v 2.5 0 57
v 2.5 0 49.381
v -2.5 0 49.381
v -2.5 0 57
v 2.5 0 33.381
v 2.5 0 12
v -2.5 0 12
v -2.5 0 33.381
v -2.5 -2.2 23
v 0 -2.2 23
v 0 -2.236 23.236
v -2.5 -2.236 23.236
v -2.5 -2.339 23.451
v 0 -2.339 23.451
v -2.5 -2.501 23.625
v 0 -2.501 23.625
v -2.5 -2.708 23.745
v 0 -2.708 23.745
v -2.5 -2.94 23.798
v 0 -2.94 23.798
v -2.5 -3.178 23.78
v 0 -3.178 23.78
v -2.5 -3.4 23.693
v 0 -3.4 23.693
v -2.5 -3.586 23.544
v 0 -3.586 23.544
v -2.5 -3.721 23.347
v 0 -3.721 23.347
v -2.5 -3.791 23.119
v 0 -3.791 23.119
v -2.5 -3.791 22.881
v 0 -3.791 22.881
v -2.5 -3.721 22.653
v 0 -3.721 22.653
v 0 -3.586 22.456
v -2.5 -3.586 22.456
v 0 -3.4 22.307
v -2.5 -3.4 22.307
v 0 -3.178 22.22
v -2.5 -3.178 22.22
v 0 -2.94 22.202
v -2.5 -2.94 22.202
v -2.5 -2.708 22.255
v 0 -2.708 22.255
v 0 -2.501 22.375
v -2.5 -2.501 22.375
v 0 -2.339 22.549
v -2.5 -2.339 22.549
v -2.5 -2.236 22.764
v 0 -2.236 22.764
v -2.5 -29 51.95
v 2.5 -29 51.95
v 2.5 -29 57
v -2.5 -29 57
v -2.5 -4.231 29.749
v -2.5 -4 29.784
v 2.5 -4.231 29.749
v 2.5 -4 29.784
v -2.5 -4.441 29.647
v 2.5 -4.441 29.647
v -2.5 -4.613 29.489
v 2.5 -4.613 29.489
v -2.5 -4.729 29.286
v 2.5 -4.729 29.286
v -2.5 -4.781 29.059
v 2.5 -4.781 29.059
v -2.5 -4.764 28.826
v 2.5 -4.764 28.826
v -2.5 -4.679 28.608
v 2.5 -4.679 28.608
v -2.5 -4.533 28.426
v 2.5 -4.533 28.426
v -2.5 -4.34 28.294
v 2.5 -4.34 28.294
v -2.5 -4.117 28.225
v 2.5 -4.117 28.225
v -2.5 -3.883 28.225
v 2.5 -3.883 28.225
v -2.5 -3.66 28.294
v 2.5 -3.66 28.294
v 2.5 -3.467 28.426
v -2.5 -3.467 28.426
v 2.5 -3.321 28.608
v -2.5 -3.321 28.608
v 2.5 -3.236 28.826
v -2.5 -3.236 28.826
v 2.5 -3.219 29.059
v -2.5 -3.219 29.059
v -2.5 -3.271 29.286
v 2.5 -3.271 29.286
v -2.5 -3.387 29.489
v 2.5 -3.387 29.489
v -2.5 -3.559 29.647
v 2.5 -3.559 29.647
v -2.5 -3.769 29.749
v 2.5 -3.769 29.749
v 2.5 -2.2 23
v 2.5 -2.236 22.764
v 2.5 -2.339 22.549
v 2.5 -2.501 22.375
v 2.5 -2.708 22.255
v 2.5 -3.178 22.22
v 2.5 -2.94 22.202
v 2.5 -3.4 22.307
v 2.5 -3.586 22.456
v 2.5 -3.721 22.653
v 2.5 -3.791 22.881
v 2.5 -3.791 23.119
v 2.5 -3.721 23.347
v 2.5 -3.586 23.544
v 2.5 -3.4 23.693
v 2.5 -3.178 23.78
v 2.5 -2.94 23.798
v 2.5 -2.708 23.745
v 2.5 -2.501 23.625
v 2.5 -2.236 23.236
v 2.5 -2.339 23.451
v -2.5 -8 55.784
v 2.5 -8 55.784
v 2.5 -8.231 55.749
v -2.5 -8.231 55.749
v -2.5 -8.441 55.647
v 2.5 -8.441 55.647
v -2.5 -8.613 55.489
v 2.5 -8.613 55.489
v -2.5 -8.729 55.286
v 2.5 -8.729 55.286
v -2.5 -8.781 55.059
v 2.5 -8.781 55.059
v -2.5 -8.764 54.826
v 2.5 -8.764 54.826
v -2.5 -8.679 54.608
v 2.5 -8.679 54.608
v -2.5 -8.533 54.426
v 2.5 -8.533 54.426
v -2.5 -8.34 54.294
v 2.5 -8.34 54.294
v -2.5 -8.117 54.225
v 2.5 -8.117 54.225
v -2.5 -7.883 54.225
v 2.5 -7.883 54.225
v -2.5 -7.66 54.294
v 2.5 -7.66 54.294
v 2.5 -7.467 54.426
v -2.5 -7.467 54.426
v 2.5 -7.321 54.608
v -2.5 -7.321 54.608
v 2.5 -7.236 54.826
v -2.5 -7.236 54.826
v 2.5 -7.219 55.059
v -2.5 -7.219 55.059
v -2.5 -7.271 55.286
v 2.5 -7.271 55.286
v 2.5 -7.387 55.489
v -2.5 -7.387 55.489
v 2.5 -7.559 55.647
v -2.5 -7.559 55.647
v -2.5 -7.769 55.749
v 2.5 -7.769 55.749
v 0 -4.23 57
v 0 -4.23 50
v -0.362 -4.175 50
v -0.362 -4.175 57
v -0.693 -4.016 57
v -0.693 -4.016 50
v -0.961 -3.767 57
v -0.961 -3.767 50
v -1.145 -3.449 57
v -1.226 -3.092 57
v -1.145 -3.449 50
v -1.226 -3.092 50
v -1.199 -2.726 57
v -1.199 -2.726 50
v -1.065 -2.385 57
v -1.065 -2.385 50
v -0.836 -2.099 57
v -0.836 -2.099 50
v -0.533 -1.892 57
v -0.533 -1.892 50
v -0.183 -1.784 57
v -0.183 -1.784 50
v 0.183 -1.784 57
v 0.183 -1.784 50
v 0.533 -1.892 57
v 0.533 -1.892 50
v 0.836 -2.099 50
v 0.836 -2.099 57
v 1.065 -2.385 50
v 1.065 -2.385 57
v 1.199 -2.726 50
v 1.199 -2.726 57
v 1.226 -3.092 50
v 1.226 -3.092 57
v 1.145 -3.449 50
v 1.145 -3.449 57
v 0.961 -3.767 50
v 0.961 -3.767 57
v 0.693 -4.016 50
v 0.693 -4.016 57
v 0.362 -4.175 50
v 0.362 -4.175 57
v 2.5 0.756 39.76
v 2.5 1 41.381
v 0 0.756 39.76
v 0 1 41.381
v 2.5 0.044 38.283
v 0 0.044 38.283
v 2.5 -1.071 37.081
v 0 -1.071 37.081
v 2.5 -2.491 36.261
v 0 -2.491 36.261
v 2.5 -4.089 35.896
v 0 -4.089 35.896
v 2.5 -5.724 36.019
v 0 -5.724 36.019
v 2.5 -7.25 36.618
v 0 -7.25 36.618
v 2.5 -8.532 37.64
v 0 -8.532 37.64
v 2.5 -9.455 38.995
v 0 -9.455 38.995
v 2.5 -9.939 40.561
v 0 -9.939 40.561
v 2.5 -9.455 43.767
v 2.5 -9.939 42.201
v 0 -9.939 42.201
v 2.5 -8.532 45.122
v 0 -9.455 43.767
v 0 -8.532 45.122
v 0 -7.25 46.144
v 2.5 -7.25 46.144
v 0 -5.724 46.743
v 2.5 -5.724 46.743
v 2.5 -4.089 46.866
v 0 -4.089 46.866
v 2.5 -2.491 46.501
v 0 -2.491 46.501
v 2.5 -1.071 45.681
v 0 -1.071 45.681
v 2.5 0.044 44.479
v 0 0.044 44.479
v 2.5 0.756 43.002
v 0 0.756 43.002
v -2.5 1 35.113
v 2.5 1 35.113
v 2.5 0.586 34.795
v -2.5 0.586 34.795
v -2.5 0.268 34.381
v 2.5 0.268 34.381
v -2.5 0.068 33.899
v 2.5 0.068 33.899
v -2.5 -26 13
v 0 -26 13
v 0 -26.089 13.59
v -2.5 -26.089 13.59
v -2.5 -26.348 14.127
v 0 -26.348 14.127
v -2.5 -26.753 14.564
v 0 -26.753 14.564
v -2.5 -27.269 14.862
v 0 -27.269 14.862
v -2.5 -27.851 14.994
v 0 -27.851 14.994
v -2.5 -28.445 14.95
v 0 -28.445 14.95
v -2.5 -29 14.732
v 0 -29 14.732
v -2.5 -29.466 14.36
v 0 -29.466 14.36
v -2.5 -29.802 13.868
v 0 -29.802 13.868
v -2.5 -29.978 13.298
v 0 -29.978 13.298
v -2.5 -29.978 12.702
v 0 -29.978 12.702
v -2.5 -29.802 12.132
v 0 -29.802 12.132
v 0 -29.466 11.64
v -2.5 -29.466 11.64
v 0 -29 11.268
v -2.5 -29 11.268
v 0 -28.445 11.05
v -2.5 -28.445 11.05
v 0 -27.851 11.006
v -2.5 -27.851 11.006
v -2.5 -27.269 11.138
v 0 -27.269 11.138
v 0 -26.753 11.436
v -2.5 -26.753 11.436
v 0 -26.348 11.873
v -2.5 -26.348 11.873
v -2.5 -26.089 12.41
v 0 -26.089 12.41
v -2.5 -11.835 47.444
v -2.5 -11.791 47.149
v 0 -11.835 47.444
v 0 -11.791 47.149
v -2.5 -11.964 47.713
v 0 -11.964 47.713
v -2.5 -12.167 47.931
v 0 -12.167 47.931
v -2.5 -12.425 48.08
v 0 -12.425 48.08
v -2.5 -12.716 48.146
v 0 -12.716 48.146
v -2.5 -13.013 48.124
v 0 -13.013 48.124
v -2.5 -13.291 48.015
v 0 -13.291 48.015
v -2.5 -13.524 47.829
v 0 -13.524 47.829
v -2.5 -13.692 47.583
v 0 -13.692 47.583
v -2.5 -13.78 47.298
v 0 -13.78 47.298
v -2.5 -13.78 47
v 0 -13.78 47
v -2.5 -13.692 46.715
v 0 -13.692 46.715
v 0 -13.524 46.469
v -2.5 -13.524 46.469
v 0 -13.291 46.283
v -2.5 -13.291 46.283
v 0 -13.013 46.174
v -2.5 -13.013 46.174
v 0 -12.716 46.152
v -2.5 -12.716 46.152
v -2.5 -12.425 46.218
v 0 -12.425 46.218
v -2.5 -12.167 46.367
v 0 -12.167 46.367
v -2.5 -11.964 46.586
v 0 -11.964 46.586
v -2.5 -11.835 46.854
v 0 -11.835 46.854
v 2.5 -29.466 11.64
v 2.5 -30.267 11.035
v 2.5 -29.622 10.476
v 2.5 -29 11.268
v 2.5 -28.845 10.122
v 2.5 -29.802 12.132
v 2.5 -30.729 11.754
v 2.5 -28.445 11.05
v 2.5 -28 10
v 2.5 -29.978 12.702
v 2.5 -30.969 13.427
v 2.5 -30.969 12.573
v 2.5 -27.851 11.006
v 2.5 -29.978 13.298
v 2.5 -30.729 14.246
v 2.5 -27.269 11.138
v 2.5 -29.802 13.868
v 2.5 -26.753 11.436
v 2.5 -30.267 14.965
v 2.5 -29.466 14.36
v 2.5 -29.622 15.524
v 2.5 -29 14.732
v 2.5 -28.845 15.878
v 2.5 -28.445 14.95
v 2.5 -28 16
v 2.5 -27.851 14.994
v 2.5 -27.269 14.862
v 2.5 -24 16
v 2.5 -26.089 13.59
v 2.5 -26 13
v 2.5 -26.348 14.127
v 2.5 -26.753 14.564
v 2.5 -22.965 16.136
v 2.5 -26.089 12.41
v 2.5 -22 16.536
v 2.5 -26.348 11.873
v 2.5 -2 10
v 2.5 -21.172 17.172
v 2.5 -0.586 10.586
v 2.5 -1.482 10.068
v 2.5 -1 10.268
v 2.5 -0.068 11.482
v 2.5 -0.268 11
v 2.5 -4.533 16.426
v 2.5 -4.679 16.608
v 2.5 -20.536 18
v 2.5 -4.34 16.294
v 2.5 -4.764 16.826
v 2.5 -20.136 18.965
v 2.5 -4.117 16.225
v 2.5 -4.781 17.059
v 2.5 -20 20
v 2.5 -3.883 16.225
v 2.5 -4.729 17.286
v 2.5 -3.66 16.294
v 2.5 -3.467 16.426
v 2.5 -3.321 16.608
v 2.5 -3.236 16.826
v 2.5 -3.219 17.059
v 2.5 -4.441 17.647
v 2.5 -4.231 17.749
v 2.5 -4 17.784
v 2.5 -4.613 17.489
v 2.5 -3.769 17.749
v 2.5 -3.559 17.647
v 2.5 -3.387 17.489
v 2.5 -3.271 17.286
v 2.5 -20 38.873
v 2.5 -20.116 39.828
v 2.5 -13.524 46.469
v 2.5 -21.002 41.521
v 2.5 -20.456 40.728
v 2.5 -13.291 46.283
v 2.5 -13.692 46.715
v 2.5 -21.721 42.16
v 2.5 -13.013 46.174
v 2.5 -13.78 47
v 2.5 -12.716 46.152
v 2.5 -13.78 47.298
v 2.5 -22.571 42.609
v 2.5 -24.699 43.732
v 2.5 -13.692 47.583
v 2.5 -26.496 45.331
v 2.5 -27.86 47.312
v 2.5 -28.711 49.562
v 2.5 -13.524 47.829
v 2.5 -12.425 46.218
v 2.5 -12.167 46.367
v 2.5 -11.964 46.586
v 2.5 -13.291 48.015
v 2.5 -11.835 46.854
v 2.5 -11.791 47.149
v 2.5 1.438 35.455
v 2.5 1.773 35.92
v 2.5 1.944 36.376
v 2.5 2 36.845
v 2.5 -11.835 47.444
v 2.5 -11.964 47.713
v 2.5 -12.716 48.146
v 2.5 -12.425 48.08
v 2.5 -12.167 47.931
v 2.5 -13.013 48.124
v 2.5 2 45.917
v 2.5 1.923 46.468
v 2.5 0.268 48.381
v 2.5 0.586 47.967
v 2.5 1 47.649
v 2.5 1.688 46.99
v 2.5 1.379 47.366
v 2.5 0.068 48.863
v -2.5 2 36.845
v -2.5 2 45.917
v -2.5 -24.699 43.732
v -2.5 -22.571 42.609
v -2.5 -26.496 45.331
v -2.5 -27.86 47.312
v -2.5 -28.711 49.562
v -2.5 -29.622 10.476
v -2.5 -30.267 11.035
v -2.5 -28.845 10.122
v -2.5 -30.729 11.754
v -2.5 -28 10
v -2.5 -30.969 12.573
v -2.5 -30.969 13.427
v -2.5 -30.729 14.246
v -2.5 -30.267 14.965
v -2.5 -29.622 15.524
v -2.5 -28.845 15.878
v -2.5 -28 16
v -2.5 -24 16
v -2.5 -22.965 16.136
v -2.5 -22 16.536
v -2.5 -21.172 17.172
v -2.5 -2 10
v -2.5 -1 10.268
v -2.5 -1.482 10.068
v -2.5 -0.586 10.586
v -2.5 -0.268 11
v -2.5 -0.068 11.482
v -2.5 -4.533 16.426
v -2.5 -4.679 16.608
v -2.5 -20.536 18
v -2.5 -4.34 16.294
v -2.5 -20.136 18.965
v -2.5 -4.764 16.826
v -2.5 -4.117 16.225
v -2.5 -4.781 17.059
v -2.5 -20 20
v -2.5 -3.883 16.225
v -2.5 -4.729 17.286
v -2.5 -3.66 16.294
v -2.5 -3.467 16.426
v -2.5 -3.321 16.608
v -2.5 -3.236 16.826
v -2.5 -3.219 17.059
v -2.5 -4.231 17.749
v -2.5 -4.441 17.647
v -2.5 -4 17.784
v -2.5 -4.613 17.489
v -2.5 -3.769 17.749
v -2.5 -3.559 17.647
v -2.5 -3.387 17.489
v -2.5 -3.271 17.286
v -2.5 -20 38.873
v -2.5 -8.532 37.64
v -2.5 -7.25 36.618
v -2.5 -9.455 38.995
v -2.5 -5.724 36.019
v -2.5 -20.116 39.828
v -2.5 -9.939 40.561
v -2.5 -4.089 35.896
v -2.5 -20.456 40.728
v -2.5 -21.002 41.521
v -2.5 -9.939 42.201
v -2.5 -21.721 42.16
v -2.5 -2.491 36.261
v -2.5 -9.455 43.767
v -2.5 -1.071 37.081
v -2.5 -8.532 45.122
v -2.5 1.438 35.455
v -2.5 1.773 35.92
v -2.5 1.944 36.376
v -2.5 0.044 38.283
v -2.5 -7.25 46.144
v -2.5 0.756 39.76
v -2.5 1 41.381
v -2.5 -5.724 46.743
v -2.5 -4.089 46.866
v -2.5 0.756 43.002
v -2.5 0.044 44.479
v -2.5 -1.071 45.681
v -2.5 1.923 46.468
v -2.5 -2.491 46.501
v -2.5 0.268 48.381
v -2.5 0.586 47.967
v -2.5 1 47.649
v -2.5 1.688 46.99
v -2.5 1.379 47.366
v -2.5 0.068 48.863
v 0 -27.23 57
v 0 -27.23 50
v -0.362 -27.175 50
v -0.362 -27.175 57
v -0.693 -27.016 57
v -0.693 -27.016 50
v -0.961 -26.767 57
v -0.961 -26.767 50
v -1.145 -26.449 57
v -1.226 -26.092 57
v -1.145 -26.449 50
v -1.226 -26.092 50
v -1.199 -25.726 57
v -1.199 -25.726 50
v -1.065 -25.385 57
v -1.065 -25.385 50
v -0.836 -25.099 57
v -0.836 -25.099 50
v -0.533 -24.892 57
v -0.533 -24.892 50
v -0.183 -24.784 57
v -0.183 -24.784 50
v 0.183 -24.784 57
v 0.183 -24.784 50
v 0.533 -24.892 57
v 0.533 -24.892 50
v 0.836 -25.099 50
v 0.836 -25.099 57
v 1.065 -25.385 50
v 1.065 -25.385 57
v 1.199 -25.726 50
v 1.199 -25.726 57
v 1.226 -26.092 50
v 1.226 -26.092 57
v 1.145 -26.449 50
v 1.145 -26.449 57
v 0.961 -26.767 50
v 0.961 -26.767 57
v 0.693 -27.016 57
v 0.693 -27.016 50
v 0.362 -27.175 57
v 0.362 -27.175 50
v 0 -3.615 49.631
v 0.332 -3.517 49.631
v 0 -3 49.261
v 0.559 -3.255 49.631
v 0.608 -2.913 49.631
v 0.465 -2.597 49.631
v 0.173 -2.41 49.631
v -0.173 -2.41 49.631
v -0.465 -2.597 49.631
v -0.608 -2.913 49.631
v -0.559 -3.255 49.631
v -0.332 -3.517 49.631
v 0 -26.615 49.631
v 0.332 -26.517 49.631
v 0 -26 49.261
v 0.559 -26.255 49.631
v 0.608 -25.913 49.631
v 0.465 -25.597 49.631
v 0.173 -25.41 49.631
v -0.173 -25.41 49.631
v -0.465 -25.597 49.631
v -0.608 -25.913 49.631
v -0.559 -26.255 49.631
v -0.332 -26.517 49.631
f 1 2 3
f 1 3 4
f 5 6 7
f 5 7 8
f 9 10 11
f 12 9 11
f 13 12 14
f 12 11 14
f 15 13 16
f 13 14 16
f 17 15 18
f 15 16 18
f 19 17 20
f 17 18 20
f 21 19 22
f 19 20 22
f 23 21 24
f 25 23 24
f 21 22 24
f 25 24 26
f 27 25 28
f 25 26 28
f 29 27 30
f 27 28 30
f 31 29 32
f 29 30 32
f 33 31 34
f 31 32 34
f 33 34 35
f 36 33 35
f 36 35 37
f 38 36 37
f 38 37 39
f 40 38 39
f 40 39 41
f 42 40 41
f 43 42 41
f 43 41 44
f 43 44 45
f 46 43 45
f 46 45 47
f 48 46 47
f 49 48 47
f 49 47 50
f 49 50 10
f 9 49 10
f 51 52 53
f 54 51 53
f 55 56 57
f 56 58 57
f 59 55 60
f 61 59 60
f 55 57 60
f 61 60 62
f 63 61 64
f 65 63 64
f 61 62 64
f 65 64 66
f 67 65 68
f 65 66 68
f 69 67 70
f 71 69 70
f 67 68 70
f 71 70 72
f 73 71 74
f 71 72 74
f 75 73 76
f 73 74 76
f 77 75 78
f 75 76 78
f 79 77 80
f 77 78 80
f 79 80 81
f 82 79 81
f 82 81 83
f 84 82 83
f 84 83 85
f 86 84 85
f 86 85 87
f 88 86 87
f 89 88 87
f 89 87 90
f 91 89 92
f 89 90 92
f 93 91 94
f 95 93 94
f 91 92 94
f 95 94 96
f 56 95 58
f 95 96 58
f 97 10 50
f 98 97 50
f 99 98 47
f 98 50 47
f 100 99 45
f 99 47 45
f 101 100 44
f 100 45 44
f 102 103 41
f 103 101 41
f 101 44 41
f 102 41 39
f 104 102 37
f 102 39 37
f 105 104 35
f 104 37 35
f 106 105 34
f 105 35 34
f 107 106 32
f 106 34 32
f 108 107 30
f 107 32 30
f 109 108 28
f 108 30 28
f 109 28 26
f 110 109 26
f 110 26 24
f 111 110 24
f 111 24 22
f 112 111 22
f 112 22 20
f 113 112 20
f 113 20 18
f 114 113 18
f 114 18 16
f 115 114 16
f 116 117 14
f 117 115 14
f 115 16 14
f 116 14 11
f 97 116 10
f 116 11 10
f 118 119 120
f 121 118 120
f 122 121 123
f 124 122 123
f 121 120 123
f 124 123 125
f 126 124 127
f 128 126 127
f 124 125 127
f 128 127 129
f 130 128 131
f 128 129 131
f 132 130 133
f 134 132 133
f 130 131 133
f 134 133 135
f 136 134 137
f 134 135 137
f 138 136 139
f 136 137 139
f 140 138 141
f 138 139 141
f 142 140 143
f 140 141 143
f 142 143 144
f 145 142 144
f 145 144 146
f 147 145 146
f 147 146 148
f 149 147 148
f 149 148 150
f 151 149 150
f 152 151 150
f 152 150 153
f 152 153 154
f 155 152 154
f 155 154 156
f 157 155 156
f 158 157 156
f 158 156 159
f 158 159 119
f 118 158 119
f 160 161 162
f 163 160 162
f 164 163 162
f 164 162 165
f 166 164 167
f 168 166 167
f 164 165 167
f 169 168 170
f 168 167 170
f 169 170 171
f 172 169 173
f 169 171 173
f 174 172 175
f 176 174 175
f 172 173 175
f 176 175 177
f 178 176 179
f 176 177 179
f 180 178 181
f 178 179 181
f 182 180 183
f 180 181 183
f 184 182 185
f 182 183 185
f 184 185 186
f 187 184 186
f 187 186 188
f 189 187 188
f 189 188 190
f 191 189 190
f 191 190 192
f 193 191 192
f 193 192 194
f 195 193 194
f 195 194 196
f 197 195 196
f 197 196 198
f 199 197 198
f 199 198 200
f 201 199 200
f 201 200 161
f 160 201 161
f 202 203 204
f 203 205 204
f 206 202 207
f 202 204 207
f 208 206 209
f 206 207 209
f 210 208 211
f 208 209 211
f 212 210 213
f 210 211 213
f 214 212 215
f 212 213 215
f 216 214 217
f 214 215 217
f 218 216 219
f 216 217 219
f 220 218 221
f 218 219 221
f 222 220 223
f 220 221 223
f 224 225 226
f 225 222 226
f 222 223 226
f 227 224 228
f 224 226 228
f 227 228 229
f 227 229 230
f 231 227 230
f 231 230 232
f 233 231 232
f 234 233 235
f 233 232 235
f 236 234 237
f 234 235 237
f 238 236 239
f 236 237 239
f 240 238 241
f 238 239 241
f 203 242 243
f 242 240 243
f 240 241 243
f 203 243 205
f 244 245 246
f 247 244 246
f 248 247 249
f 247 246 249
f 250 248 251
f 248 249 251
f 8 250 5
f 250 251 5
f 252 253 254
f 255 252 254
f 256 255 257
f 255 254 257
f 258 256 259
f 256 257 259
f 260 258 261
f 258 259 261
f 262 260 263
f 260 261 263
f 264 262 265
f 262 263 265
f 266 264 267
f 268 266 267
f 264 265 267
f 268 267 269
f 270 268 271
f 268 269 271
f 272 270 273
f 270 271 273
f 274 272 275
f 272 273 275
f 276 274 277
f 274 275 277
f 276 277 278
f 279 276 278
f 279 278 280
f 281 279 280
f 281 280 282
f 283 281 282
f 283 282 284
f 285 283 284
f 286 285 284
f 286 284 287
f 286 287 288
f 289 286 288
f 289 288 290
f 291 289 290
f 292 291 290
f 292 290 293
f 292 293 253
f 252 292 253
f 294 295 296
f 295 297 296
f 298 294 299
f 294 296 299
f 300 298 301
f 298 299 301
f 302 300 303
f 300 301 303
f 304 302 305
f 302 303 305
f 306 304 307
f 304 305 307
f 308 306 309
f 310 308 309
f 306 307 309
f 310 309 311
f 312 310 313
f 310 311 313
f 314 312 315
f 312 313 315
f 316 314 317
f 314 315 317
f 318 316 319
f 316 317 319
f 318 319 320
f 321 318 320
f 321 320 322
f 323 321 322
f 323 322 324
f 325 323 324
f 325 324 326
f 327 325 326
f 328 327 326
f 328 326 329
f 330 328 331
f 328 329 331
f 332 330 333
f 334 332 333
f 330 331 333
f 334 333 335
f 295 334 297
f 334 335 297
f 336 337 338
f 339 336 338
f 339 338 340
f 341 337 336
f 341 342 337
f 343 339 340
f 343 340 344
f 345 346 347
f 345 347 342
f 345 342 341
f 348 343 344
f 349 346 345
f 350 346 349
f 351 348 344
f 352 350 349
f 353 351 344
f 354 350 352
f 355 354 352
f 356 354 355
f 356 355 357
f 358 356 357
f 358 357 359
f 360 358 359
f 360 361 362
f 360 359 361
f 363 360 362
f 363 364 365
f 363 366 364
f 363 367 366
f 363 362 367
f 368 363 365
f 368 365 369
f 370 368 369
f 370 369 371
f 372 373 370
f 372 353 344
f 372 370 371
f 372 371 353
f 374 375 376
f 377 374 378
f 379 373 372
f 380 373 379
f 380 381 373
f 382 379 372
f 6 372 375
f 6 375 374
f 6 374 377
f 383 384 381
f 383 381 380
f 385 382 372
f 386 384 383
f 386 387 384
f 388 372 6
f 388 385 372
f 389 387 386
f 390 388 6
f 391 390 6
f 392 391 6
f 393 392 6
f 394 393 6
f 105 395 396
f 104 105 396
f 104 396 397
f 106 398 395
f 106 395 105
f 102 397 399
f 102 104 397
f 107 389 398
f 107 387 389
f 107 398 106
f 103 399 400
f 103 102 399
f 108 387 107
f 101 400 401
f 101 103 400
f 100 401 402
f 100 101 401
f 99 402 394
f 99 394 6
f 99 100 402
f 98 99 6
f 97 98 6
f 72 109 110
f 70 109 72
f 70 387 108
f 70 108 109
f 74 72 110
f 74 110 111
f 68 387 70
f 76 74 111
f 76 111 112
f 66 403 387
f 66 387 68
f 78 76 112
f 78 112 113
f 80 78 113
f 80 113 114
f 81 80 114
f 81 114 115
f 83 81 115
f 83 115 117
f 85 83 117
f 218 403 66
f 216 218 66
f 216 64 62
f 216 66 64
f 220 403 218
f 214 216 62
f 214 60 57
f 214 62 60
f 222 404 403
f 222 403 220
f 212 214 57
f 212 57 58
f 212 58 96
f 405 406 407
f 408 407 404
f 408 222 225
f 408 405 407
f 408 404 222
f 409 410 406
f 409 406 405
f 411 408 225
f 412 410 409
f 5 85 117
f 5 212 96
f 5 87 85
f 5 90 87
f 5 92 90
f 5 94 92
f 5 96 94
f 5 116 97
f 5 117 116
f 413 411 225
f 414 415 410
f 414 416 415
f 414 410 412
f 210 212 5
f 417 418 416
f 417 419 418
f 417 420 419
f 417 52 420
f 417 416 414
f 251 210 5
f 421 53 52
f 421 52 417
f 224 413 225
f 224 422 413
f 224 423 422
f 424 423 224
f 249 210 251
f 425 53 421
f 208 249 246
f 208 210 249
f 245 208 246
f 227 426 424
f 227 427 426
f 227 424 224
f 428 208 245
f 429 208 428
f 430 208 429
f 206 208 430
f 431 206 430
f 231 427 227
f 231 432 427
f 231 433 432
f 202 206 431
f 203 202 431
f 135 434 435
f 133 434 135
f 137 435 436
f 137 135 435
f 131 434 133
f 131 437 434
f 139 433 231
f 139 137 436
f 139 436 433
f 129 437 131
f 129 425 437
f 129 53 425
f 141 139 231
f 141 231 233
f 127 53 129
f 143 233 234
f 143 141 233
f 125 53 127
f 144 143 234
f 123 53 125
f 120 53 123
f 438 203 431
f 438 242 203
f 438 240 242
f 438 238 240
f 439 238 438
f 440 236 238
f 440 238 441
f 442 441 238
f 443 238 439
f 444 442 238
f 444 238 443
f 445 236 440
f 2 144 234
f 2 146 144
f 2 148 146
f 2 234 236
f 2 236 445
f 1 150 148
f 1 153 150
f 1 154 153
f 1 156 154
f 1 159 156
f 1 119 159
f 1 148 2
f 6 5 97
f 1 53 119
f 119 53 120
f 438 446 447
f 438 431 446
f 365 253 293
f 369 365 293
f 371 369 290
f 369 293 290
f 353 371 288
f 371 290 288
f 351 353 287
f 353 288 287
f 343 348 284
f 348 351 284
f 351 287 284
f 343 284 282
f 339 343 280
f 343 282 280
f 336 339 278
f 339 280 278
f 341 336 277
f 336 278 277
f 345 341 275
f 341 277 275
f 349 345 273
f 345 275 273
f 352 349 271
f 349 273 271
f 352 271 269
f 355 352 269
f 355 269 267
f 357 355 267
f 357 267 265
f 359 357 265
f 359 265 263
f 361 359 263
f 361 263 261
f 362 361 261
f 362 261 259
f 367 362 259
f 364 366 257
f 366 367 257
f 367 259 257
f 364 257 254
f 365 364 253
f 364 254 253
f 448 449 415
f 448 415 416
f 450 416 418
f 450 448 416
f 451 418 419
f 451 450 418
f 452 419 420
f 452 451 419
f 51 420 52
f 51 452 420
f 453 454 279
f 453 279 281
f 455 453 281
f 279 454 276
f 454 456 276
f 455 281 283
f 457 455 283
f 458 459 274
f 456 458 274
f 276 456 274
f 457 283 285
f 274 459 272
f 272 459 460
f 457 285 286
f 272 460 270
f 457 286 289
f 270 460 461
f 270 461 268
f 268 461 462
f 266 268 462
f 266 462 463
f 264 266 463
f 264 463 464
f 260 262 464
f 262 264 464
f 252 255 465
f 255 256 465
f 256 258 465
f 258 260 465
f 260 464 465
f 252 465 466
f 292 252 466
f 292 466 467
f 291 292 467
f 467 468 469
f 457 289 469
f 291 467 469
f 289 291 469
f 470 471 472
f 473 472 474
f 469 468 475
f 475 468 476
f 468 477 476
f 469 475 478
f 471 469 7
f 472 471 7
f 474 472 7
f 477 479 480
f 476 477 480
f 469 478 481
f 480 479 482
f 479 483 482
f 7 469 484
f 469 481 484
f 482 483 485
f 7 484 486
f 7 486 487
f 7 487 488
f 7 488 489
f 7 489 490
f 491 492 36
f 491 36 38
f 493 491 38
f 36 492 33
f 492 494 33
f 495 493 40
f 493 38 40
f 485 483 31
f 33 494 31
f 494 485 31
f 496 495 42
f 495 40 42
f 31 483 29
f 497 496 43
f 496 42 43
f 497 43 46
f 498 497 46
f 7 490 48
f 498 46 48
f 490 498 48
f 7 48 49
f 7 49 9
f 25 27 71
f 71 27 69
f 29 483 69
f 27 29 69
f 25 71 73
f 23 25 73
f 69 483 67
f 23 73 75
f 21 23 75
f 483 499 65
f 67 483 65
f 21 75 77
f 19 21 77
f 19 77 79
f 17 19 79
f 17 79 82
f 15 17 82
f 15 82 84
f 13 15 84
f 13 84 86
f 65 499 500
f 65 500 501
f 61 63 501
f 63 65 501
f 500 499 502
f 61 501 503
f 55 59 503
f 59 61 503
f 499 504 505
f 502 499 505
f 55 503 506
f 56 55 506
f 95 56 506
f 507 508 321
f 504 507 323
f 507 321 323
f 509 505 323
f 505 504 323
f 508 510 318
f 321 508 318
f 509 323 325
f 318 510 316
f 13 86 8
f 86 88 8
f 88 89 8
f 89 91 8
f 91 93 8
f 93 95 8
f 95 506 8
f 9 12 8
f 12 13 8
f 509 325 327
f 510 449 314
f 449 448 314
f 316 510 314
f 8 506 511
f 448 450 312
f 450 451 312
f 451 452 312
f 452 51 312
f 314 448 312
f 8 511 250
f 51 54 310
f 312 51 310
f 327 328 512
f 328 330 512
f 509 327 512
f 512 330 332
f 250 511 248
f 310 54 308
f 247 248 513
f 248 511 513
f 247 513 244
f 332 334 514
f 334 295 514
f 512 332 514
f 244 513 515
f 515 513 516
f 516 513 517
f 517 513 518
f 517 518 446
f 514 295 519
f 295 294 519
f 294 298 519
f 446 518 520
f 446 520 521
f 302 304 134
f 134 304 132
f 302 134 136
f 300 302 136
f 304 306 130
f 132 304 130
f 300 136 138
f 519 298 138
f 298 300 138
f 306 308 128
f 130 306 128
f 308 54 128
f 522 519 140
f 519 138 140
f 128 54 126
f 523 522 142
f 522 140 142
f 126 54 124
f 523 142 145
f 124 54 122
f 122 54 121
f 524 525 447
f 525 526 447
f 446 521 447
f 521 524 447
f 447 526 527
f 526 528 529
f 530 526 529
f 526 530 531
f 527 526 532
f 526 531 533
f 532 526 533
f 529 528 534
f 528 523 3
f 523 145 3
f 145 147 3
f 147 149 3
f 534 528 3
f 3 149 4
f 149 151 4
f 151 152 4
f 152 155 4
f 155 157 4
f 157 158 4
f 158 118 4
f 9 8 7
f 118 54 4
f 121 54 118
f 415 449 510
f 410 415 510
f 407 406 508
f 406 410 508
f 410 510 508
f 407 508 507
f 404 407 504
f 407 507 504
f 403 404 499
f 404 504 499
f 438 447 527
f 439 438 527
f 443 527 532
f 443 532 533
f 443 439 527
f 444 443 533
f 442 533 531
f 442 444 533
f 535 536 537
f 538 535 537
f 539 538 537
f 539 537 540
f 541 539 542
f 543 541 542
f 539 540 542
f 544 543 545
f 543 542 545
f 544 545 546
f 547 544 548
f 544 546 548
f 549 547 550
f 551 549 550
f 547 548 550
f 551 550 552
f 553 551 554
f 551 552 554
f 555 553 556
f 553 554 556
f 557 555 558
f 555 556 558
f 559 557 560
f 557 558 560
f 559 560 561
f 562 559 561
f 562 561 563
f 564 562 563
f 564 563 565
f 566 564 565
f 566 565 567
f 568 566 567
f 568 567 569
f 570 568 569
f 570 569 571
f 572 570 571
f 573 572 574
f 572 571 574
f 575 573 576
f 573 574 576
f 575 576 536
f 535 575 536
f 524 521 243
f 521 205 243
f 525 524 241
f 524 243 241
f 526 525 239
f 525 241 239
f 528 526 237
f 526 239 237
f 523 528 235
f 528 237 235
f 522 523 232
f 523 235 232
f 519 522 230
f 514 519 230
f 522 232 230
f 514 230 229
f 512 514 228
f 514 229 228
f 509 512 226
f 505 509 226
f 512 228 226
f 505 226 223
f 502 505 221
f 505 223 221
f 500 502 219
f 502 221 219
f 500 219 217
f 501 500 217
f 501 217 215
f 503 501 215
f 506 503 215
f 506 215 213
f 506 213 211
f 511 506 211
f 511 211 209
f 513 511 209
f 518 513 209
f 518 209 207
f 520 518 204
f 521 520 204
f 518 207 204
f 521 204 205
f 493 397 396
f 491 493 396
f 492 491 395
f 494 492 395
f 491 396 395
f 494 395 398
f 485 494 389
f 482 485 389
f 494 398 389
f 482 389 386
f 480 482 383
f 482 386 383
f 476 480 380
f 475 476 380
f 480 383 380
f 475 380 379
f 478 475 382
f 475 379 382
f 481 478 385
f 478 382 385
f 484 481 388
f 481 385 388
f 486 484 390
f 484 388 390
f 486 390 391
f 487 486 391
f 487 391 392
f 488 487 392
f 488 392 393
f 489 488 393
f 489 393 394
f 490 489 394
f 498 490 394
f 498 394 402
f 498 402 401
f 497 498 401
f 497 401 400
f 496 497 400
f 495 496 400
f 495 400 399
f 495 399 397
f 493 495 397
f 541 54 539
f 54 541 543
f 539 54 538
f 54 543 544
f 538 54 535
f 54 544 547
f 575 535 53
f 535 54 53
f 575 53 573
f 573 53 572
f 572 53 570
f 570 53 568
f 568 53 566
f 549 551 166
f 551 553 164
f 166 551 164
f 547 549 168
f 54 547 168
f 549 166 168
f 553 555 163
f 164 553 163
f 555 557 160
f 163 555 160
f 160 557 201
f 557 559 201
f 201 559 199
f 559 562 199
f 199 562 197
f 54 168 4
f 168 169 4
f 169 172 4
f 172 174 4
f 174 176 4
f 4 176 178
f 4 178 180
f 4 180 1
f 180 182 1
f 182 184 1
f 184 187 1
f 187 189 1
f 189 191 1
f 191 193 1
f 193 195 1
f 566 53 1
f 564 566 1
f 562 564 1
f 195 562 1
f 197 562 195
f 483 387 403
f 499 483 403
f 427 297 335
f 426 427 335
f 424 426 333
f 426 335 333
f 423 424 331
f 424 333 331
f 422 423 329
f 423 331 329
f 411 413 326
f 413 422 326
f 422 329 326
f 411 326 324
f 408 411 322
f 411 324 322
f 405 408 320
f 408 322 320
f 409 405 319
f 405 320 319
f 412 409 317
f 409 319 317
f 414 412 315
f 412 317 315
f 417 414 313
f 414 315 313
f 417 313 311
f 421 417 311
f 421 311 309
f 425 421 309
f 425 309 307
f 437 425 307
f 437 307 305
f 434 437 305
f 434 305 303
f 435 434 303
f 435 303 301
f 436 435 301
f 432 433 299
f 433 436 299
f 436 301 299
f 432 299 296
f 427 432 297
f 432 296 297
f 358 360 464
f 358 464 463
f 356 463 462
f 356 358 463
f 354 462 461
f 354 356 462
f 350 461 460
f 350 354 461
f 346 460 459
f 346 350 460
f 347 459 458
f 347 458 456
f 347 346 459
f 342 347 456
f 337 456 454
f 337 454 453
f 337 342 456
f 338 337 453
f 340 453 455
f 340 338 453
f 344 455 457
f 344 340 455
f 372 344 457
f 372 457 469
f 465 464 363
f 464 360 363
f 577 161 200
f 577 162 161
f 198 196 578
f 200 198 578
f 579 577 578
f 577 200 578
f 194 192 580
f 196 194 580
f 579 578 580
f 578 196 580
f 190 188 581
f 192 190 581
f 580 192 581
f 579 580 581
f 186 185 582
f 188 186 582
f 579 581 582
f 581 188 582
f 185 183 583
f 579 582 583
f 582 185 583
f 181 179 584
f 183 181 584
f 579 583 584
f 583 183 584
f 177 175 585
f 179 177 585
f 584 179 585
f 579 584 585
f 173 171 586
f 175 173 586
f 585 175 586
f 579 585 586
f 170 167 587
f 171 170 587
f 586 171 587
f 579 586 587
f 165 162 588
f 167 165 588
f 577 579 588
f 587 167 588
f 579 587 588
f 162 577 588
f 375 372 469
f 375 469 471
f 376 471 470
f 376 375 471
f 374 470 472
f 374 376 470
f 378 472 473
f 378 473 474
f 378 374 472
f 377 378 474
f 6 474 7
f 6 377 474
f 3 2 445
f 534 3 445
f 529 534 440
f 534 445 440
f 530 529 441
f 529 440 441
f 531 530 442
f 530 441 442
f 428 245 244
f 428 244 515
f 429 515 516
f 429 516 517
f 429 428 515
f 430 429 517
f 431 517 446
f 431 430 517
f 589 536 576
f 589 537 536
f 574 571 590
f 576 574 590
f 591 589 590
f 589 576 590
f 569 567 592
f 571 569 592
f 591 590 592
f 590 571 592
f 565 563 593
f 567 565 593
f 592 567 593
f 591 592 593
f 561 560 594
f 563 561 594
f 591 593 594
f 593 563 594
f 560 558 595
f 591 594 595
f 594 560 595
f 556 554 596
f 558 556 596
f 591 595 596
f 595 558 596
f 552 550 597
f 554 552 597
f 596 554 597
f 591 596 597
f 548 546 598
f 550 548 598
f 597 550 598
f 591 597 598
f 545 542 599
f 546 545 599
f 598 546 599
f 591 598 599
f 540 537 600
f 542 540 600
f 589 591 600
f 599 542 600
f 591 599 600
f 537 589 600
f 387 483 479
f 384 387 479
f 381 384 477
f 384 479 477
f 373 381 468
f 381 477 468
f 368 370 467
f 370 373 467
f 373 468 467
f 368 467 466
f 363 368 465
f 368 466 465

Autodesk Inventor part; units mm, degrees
ref_plane "YZ Plane" through (0, 0, 0) normal (1, 0, 0) x (0, 1, 0)
ref_plane "XZ Plane" through (0, 0, 0) normal (0, 1, 0) x (-1, 0, 0)
ref_plane "XY Plane" through (0, 0, 0) normal (0, 0, 1) x (1, 0, 0)
sketch "Skizze1" plane through (0, 0, 0) normal (1, 0, 0) x (0, 1, 0)
  circle A0 centre (-22.8, 48.5) radius 11 construction
  circle A1 centre (-4.5, 41.3809) radius 6.5 construction
  line L0 (-97.6965, 0) -> (58.2827, 0) projected
  circle A2 centre (14.5, 21.5) radius 21.5 construction
  line L1 (-28, 10) -> (0, 10)
  line L2 (0, 10) -> (0, 35.3809)
  line L3 (-7, 0) -> (-7, 21.5) construction
  circle A3 centre (-4.5, 41.3809) radius 6 construction
  circle A4 centre (-4.5, 41.3809) radius 5 construction
  line L4 (-56.6136, 29) -> (0, 29) construction
  arc A5 (-28, 16) -> (-28, 10) centre (-28, 13) ccw
  line L5 (-75.4137, 30) -> (0, 30) construction
  line L6 (-28, 16) -> (-20, 16)
  line L7 (-20, 16) -> (-20, 42)
  line L8 (-20, 42) -> (-29, 42)
  line L9 (-29, 42) -> (-29, 57)
  circle A6 centre (-28, 13) radius 2
  circle A7 centre (-4.5, 41.3809) radius 5.5
  circle A8 centre (-22.8, 48.5) radius 0.5
  circle A9 centre (-3, 23) radius 0.8
  line L10 (14.5, 21.5) -> (-7, 21.5) construction
  line L11 (-29, 57) -> (0, 57)
  line L12 (-4.5, 41.3809) -> (-28, 13) construction
  line L13 (14.5, 21.5) -> (14.5, 20.5) construction
  line L14 (14.5, 20.5) -> (-4.5, 41.3809) construction
  circle A10 centre (-22.8, 48.5) radius 5 construction
  circle A11 centre (-12.7907, 47.1492) radius 5.1 construction
  circle A12 centre (-12.7907, 47.1492) radius 5.6 construction
  circle A13 centre (-12.7907, 47.1492) radius 1
  line L15 (0, 35.3809) -> (2, 35.3809)
  line L16 (2, 35.3809) -> (2, 47.3809)
  line L17 (2, 47.3809) -> (0, 47.3809)
  line L18 (0, 47.3809) -> (0, 57)
  line L19 (1, 41.3809) -> (-10, 41.3809) construction
  point P0 (0, 0)
  dimension "d4" = 43
  dimension "d0" = 22
  dimension "d2" = 13
  dimension "d5" = 10
  dimension "d6" = 7
  dimension "d7" = 12
  dimension "d8" = 10
  dimension "d9" = 29
  dimension "d11" = 30
  dimension "d12" = 4
  dimension "d14" = 6
  dimension "d15" = 28
  dimension "d16" = 20
  dimension "d17" = 42
  dimension "d19" = 29
  dimension "d20" = 11
  dimension "d33" = 1
  dimension "d34" = 48.5
  dimension "d36" = 1.6
  dimension "d37" = 3
  dimension "d54" = 57
  dimension "d58" = 1
  dimension "d59" = 81.925
  dimension "d65" = 10
  dimension "d66" = 10.2
  dimension "d67" = 0.5
  dimension "d68" = 2
  dimension "d69" = 2
  dimension "d70" = 6
  dimension "d72" = 1.5
  dimension "d73" = 22.8
extrude "Extrusion1" add sketch "Skizze1" along normal mid plane 5 contours A5 L6 L7 L8 L9 L11 L18 L17 L16 L15 L2 L1 | A8
sketch "Skizze2" plane through (-2.5, -29, 57) normal (0, 0, 1) x (1, 0, 0)
  line L0 (0, 0) -> (5, 0) projected
  line L1 (5, 5) -> (5, 0) projected
  line L2 (0, 0) -> (0, 5) projected
  line L3 (2.5, 29) -> (2.5, 0) construction
  line L4 (0, 0) -> (5, 0) construction
  line L5 (0, 5) -> (5, 5) projected
  line L6 (0, 29) -> (5, 29) projected
  line L7 (0, 29) -> (5, 29) projected
  point P0 (2.5, 26)
  point P1 (2.5, 3)
  dimension "d25" = 23
  dimension "d74" = 3
hole "Bohrung1" at (0, -3, 57) at (0, -26, 57) direction (0, 0, -1) diameter 2.459 depth 7 tip angle 118 thread size "M3x0.5" class "6H" standard "ISO Metric profile"
fillet "Rundung1" radius 10 1 edges at (0, -29, 42)
sketch "Skizze3" plane through (-2.5, 0, 0) normal (-1, 0, 0) x (0, 0, 1)
  circle A0 centre (23, -3) radius 0.8 projected
  line L0 (29, -4) -> (17, -4) construction
  circle A1 centre (23, -3) radius 0.8 construction
  line L1 (23, -4) -> (23, -3) construction
  point P0 (0, 0)
  point P1 (55, -8)
  dimension "d38" = 12
  dimension "d39" = 1
  dimension "d40" = 32
  dimension "d41" = 5
hole "Bohrung2" at (-2.5, -4, 17) at (-2.5, -4, 29) at (-2.5, -8, 55) direction (1, 0, 0) diameter 1.567 end through all thread size "M2x0.4" class "6H" standard "ISO Metric profile"
fillet "Rundung2" radius 4 2 edges at (0, -20, 42) (0, -20, 16)
fillet "Rundung3" radius 2 1 edges at (0, 0, 10)
fillet "Rundung4" radius 2 4 edges at (0, 0, 47.3809) (0, 2, 47.3809) (0, 2, 35.3809) (0, 0, 35.3809)
properties part number "Dribbler Seite" material "Aluminium 6061"
